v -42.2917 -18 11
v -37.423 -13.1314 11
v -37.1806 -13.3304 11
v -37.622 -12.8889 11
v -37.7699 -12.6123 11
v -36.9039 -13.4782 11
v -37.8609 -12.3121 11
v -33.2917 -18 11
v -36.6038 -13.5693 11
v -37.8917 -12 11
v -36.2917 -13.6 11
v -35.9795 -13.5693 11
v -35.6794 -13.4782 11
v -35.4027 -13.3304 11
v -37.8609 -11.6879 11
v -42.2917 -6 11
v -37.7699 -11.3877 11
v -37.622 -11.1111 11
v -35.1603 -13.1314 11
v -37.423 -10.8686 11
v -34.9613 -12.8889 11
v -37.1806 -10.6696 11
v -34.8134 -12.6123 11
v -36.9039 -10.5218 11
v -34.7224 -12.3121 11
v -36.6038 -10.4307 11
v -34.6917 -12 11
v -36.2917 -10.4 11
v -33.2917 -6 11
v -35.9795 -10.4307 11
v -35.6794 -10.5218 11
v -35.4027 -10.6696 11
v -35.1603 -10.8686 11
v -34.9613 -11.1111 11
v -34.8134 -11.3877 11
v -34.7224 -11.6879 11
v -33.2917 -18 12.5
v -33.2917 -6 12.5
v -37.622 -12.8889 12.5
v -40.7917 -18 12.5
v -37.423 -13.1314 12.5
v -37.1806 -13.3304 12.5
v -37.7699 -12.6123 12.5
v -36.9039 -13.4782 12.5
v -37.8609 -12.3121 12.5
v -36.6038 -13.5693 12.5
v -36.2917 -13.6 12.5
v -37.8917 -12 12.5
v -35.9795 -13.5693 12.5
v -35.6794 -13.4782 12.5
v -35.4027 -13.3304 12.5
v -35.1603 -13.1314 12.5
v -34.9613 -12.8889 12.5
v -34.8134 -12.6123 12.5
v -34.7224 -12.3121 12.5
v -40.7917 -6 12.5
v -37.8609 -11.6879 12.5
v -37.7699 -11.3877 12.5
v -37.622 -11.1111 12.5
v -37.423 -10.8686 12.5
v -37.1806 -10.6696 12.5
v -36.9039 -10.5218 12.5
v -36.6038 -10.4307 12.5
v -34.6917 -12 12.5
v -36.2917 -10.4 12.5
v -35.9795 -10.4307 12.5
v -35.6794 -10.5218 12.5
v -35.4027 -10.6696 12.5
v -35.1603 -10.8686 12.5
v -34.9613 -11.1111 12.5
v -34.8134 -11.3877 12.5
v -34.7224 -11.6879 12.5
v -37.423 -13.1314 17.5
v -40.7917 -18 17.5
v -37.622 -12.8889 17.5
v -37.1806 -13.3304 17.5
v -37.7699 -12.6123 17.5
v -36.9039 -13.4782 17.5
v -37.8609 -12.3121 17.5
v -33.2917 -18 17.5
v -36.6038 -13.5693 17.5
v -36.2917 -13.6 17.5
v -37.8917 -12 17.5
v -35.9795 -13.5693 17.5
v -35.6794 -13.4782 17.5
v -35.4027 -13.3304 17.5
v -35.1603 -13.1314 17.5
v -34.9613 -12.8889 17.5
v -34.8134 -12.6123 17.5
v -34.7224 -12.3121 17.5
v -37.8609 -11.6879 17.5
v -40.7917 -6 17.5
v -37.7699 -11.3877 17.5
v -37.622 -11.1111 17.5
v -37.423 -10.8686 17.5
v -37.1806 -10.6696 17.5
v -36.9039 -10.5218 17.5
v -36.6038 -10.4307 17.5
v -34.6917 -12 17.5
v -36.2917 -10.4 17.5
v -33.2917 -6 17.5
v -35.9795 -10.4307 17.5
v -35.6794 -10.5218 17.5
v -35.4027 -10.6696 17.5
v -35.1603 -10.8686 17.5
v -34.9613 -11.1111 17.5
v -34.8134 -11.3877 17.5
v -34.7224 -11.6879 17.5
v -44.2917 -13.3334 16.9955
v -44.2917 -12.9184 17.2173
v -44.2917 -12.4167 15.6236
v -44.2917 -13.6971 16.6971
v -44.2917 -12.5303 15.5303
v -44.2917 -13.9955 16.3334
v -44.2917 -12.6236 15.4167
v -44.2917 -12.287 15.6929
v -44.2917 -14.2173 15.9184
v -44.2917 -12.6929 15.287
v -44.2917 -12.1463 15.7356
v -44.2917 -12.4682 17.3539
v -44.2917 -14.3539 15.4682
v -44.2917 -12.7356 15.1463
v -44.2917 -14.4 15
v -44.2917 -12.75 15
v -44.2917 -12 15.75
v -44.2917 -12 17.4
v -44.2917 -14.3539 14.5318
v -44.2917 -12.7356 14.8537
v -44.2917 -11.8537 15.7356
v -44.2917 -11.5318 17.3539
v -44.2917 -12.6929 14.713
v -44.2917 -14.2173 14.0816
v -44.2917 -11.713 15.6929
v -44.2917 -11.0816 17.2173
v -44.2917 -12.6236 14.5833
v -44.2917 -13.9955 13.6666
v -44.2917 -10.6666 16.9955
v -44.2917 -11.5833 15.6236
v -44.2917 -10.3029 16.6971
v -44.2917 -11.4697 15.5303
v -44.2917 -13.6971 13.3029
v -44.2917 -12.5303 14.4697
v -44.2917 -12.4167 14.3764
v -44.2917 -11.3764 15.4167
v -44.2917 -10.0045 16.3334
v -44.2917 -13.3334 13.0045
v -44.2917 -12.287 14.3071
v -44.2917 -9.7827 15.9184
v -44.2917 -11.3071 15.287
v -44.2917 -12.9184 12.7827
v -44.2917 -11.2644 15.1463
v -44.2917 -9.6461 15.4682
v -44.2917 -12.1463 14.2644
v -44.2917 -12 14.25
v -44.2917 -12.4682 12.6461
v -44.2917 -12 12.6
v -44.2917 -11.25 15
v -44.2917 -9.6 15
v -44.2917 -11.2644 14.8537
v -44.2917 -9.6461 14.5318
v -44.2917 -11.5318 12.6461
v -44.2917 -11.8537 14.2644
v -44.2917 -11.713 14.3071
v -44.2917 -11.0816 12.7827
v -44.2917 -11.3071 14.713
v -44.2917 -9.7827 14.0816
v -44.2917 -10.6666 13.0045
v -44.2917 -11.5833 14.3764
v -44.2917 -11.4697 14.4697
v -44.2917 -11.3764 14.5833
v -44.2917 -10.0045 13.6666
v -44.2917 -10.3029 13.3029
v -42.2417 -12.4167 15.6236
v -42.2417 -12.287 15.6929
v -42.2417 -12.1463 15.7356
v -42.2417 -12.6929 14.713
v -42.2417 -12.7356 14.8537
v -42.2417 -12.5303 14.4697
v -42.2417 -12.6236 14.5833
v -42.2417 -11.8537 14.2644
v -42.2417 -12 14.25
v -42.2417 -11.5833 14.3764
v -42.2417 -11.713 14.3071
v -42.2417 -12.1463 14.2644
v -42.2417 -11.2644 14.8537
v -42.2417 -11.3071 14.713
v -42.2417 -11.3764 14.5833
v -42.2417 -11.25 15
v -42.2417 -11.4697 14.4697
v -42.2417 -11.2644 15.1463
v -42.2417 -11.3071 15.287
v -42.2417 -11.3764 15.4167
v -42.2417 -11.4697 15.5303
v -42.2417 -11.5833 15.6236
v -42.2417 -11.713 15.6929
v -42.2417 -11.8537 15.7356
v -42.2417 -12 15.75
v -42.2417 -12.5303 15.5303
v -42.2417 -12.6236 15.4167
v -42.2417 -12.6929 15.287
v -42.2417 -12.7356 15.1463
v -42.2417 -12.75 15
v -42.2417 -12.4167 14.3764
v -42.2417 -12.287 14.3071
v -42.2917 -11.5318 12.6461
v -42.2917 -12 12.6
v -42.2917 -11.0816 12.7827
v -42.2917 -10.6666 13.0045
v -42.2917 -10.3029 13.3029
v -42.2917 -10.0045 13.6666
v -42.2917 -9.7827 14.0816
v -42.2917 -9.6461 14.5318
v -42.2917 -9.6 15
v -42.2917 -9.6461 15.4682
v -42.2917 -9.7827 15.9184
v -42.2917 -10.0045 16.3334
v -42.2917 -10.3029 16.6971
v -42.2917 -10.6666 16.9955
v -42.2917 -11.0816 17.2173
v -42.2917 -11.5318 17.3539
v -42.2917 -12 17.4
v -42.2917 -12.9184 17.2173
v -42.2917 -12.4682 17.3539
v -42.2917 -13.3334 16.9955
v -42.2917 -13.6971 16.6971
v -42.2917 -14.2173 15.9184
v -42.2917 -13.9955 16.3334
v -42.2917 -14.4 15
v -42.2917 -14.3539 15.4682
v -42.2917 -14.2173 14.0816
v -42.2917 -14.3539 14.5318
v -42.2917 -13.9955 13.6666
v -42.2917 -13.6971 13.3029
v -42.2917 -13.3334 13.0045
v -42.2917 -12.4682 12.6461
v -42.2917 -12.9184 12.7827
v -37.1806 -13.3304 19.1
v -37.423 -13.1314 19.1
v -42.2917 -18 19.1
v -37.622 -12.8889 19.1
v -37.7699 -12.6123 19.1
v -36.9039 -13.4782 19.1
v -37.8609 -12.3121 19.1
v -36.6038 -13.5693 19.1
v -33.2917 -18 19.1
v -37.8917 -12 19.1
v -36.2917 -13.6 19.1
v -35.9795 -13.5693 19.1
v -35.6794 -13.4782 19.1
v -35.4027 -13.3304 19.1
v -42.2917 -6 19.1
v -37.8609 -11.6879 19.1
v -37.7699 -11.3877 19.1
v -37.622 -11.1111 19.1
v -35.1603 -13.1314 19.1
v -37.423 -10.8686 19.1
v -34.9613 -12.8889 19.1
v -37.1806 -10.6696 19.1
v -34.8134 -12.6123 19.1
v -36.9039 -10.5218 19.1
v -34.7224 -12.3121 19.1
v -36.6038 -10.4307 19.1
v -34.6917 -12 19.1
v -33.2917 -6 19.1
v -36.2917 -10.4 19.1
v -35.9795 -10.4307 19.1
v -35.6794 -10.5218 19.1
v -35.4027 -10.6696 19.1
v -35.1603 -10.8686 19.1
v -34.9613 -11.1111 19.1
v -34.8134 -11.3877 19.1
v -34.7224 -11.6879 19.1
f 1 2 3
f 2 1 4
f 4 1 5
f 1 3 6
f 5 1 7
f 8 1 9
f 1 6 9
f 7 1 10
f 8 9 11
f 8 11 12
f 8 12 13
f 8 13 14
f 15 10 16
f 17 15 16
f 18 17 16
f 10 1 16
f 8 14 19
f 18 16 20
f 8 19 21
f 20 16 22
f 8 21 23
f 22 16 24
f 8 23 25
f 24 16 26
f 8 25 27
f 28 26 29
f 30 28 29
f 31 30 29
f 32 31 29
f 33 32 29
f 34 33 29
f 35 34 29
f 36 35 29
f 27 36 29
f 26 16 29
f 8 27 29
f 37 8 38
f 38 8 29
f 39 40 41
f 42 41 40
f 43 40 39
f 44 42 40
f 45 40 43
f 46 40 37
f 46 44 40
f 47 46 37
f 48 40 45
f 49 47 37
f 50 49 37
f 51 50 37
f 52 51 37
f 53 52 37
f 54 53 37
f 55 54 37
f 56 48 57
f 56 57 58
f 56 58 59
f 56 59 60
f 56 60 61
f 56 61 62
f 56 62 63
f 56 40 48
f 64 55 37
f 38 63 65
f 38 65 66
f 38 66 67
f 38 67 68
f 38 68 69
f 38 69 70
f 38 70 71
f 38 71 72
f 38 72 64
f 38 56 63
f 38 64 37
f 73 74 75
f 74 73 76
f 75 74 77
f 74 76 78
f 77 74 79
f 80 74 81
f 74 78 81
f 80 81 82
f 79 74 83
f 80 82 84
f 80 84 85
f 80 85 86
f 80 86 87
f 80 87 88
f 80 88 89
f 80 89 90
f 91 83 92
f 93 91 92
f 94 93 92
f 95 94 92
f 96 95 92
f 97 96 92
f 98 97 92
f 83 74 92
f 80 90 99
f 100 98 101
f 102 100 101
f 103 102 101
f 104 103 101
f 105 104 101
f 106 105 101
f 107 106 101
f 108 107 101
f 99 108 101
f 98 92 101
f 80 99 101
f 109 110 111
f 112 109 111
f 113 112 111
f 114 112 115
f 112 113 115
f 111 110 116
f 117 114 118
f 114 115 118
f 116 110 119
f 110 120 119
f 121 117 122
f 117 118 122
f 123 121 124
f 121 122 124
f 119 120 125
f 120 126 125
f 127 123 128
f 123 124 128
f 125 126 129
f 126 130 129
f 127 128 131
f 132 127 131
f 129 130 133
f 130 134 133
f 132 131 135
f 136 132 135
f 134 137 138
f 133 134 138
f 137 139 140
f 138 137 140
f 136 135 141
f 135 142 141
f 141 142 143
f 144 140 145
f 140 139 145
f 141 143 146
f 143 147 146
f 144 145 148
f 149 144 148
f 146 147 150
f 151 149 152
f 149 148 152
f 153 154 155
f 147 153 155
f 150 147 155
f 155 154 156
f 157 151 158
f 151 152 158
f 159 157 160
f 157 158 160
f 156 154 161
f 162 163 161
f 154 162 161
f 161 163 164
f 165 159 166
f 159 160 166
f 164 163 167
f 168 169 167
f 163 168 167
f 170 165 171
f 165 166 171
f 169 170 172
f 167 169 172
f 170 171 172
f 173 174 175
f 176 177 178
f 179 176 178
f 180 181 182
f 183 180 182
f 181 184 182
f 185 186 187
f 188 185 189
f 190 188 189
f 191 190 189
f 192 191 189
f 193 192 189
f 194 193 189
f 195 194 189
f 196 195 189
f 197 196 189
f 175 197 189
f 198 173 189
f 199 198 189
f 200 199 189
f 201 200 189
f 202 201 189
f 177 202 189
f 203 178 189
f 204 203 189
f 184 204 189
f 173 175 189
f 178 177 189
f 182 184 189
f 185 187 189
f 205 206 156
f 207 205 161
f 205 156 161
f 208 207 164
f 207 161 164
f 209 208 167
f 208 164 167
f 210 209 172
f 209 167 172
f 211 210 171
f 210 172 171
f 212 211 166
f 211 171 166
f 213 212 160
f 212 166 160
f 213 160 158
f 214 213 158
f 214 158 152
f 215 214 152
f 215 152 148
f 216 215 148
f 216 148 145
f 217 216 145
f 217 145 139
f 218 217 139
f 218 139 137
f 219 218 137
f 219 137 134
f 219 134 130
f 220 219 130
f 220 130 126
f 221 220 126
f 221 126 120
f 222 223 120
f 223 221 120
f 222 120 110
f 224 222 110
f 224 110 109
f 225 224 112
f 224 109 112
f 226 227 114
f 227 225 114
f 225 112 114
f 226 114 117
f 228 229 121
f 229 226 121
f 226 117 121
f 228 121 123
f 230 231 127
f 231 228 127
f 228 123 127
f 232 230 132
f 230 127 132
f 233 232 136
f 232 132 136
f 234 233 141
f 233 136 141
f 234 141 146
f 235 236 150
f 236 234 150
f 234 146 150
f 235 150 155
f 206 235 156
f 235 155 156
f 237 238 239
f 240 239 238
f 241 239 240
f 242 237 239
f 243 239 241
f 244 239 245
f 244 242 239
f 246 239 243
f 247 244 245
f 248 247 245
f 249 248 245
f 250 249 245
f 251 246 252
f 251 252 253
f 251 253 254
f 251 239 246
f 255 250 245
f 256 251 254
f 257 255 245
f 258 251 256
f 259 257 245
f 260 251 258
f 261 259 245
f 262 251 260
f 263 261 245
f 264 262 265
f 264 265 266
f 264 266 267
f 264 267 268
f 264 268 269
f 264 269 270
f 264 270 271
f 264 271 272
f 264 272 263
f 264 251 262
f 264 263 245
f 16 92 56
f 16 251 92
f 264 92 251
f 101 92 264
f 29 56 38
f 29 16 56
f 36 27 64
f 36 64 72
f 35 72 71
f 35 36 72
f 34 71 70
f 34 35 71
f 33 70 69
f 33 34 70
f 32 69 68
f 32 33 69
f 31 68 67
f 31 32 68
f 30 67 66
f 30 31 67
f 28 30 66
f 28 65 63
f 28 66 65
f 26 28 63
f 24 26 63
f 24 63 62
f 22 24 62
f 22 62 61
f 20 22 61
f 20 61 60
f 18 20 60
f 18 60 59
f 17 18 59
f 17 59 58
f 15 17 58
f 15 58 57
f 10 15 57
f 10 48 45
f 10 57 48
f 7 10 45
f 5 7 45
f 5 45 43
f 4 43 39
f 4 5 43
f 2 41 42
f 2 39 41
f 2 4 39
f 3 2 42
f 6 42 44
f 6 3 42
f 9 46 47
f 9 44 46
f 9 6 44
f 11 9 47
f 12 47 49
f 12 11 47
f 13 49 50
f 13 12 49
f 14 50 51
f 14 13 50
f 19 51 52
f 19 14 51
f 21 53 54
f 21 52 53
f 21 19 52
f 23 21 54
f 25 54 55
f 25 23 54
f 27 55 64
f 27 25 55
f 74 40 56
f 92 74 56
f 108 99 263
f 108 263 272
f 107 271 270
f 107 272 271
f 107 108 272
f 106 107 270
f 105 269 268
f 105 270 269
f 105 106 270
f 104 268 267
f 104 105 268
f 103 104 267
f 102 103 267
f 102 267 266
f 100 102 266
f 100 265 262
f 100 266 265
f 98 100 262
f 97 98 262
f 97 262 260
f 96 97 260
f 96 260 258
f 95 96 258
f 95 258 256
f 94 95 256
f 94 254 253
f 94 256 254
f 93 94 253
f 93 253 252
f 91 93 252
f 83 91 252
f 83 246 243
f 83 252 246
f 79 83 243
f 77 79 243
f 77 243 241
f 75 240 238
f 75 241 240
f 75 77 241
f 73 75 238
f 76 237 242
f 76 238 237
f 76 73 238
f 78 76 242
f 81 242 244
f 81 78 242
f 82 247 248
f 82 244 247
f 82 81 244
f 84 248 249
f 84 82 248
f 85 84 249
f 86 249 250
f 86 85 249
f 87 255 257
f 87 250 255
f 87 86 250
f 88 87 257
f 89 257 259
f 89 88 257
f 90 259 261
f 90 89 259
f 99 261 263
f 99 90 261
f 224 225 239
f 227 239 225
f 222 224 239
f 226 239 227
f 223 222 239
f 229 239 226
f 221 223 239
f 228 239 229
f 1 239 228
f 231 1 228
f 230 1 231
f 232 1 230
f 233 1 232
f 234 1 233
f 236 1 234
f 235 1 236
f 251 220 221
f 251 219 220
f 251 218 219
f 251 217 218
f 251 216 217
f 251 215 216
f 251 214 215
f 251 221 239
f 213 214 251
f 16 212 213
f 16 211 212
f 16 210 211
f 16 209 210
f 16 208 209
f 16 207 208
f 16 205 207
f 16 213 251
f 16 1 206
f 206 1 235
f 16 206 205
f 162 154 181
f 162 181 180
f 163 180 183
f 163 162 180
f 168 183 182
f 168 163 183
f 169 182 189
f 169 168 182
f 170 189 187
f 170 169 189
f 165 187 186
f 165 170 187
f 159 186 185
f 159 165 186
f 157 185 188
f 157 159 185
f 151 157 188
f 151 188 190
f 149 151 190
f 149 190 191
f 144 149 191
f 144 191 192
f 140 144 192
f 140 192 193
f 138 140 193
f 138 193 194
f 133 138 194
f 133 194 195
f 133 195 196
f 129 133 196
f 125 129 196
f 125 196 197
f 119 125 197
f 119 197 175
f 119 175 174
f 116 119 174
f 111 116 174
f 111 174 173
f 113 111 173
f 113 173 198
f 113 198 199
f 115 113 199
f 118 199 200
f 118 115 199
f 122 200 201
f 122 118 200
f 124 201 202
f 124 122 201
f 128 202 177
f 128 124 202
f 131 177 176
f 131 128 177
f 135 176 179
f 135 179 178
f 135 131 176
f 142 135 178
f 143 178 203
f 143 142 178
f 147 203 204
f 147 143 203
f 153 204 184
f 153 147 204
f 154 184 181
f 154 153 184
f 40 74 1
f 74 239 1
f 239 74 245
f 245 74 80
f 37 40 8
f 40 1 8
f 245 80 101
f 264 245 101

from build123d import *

# Parameters (mm, degrees)
SPRING_FRONT_CABLE_CLEVIS_1_SKETCH_W  = 1.5
SPRING_FRONT_CABLE_CLEVIS_1_SKETCH_H  = 12
SPRING_FRONT_CABLE_CLEVIS_1_DEPTH     = 8.1
SPRING_FRONT_CLEVIS_1_LOWER_SKETCH_W  = 7.6
SPRING_FRONT_CLEVIS_1_LOWER_SKETCH_H  = 12
SPRING_FRONT_CLEVIS_1_LOWER_DEPTH     = 1.5
SPRING_FRONT_CLEVIS_1_UPPER_SKETCH_W  = 7.6
SPRING_FRONT_CLEVIS_1_UPPER_SKETCH_H  = 12
SPRING_FRONT_CLEVIS_1_UPPER_DEPTH     = 1.6
FRONT_CLEVIS_SWAGE_HOUSING_1_SKETCH_R = 2.4
FRONT_CLEVIS_SWAGE_HOUSING_1_DEPTH    = 2.1
FRONT_CLEVIS_SWAGE_BORE_1_SKETCH_R    = 0.75
FRONT_CLEVIS_SWAGE_BORE_1_DEPTH       = 2.15
FRONT_CLEVIS_PIN_BORE_1_SKETCH_R      = 1.6
FRONT_CLEVIS_PIN_BORE_1_DEPTH         = 8.3


with BuildPart() as part:
    # Spring Front Cable Clevis 1 sketch → Spring Front Cable Clevis 1 (new body)
    with BuildSketch(Plane.XY.offset(11)):
        with Locations((-41.541651246, -12)):
            Rectangle(SPRING_FRONT_CABLE_CLEVIS_1_SKETCH_W, SPRING_FRONT_CABLE_CLEVIS_1_SKETCH_H)
    extrude(amount=SPRING_FRONT_CABLE_CLEVIS_1_DEPTH)

    # Spring Front Clevis 1 Lower sketch → Spring Front Clevis 1 Lower (add)
    with BuildSketch(Plane.XY.offset(11)):
        with Locations((-37.091651246, -12)):
            Rectangle(SPRING_FRONT_CLEVIS_1_LOWER_SKETCH_W, SPRING_FRONT_CLEVIS_1_LOWER_SKETCH_H)
    extrude(amount=SPRING_FRONT_CLEVIS_1_LOWER_DEPTH)

    # Spring Front Clevis 1 Upper sketch → Spring Front Clevis 1 Upper (add)
    with BuildSketch(Plane.XY.offset(17.5)):
        with Locations((-37.091651246, -12)):
            Rectangle(SPRING_FRONT_CLEVIS_1_UPPER_SKETCH_W, SPRING_FRONT_CLEVIS_1_UPPER_SKETCH_H)
    extrude(amount=SPRING_FRONT_CLEVIS_1_UPPER_DEPTH)

    # Front Clevis Swage Housing 1 sketch → Front Clevis Swage Housing 1 (add)
    with BuildSketch(Plane(origin=(-44.291651246, 0, 0), x_dir=(0, 0, -1), z_dir=(1, 0, 0))):
        with Locations((-15, -12)):
            Circle(FRONT_CLEVIS_SWAGE_HOUSING_1_SKETCH_R)
    extrude(amount=FRONT_CLEVIS_SWAGE_HOUSING_1_DEPTH)

    # Front Clevis Swage Bore 1 sketch → Front Clevis Swage Bore 1 (cut)
    with BuildSketch(Plane(origin=(-44.391651246, 0, 0), x_dir=(0, 0, -1), z_dir=(1, 0, 0))):
        with Locations((-15, -12)):
            Circle(FRONT_CLEVIS_SWAGE_BORE_1_SKETCH_R)
    extrude(amount=FRONT_CLEVIS_SWAGE_BORE_1_DEPTH, mode=Mode.SUBTRACT)

    # Front Clevis Pin Bore 1 sketch → Front Clevis Pin Bore 1 (cut)
    with BuildSketch(Plane.XY.offset(10.9)):
        with Locations((-36.291651246, -12)):
            Circle(FRONT_CLEVIS_PIN_BORE_1_SKETCH_R)
    extrude(amount=FRONT_CLEVIS_PIN_BORE_1_DEPTH, mode=Mode.SUBTRACT)


solid = part.part
